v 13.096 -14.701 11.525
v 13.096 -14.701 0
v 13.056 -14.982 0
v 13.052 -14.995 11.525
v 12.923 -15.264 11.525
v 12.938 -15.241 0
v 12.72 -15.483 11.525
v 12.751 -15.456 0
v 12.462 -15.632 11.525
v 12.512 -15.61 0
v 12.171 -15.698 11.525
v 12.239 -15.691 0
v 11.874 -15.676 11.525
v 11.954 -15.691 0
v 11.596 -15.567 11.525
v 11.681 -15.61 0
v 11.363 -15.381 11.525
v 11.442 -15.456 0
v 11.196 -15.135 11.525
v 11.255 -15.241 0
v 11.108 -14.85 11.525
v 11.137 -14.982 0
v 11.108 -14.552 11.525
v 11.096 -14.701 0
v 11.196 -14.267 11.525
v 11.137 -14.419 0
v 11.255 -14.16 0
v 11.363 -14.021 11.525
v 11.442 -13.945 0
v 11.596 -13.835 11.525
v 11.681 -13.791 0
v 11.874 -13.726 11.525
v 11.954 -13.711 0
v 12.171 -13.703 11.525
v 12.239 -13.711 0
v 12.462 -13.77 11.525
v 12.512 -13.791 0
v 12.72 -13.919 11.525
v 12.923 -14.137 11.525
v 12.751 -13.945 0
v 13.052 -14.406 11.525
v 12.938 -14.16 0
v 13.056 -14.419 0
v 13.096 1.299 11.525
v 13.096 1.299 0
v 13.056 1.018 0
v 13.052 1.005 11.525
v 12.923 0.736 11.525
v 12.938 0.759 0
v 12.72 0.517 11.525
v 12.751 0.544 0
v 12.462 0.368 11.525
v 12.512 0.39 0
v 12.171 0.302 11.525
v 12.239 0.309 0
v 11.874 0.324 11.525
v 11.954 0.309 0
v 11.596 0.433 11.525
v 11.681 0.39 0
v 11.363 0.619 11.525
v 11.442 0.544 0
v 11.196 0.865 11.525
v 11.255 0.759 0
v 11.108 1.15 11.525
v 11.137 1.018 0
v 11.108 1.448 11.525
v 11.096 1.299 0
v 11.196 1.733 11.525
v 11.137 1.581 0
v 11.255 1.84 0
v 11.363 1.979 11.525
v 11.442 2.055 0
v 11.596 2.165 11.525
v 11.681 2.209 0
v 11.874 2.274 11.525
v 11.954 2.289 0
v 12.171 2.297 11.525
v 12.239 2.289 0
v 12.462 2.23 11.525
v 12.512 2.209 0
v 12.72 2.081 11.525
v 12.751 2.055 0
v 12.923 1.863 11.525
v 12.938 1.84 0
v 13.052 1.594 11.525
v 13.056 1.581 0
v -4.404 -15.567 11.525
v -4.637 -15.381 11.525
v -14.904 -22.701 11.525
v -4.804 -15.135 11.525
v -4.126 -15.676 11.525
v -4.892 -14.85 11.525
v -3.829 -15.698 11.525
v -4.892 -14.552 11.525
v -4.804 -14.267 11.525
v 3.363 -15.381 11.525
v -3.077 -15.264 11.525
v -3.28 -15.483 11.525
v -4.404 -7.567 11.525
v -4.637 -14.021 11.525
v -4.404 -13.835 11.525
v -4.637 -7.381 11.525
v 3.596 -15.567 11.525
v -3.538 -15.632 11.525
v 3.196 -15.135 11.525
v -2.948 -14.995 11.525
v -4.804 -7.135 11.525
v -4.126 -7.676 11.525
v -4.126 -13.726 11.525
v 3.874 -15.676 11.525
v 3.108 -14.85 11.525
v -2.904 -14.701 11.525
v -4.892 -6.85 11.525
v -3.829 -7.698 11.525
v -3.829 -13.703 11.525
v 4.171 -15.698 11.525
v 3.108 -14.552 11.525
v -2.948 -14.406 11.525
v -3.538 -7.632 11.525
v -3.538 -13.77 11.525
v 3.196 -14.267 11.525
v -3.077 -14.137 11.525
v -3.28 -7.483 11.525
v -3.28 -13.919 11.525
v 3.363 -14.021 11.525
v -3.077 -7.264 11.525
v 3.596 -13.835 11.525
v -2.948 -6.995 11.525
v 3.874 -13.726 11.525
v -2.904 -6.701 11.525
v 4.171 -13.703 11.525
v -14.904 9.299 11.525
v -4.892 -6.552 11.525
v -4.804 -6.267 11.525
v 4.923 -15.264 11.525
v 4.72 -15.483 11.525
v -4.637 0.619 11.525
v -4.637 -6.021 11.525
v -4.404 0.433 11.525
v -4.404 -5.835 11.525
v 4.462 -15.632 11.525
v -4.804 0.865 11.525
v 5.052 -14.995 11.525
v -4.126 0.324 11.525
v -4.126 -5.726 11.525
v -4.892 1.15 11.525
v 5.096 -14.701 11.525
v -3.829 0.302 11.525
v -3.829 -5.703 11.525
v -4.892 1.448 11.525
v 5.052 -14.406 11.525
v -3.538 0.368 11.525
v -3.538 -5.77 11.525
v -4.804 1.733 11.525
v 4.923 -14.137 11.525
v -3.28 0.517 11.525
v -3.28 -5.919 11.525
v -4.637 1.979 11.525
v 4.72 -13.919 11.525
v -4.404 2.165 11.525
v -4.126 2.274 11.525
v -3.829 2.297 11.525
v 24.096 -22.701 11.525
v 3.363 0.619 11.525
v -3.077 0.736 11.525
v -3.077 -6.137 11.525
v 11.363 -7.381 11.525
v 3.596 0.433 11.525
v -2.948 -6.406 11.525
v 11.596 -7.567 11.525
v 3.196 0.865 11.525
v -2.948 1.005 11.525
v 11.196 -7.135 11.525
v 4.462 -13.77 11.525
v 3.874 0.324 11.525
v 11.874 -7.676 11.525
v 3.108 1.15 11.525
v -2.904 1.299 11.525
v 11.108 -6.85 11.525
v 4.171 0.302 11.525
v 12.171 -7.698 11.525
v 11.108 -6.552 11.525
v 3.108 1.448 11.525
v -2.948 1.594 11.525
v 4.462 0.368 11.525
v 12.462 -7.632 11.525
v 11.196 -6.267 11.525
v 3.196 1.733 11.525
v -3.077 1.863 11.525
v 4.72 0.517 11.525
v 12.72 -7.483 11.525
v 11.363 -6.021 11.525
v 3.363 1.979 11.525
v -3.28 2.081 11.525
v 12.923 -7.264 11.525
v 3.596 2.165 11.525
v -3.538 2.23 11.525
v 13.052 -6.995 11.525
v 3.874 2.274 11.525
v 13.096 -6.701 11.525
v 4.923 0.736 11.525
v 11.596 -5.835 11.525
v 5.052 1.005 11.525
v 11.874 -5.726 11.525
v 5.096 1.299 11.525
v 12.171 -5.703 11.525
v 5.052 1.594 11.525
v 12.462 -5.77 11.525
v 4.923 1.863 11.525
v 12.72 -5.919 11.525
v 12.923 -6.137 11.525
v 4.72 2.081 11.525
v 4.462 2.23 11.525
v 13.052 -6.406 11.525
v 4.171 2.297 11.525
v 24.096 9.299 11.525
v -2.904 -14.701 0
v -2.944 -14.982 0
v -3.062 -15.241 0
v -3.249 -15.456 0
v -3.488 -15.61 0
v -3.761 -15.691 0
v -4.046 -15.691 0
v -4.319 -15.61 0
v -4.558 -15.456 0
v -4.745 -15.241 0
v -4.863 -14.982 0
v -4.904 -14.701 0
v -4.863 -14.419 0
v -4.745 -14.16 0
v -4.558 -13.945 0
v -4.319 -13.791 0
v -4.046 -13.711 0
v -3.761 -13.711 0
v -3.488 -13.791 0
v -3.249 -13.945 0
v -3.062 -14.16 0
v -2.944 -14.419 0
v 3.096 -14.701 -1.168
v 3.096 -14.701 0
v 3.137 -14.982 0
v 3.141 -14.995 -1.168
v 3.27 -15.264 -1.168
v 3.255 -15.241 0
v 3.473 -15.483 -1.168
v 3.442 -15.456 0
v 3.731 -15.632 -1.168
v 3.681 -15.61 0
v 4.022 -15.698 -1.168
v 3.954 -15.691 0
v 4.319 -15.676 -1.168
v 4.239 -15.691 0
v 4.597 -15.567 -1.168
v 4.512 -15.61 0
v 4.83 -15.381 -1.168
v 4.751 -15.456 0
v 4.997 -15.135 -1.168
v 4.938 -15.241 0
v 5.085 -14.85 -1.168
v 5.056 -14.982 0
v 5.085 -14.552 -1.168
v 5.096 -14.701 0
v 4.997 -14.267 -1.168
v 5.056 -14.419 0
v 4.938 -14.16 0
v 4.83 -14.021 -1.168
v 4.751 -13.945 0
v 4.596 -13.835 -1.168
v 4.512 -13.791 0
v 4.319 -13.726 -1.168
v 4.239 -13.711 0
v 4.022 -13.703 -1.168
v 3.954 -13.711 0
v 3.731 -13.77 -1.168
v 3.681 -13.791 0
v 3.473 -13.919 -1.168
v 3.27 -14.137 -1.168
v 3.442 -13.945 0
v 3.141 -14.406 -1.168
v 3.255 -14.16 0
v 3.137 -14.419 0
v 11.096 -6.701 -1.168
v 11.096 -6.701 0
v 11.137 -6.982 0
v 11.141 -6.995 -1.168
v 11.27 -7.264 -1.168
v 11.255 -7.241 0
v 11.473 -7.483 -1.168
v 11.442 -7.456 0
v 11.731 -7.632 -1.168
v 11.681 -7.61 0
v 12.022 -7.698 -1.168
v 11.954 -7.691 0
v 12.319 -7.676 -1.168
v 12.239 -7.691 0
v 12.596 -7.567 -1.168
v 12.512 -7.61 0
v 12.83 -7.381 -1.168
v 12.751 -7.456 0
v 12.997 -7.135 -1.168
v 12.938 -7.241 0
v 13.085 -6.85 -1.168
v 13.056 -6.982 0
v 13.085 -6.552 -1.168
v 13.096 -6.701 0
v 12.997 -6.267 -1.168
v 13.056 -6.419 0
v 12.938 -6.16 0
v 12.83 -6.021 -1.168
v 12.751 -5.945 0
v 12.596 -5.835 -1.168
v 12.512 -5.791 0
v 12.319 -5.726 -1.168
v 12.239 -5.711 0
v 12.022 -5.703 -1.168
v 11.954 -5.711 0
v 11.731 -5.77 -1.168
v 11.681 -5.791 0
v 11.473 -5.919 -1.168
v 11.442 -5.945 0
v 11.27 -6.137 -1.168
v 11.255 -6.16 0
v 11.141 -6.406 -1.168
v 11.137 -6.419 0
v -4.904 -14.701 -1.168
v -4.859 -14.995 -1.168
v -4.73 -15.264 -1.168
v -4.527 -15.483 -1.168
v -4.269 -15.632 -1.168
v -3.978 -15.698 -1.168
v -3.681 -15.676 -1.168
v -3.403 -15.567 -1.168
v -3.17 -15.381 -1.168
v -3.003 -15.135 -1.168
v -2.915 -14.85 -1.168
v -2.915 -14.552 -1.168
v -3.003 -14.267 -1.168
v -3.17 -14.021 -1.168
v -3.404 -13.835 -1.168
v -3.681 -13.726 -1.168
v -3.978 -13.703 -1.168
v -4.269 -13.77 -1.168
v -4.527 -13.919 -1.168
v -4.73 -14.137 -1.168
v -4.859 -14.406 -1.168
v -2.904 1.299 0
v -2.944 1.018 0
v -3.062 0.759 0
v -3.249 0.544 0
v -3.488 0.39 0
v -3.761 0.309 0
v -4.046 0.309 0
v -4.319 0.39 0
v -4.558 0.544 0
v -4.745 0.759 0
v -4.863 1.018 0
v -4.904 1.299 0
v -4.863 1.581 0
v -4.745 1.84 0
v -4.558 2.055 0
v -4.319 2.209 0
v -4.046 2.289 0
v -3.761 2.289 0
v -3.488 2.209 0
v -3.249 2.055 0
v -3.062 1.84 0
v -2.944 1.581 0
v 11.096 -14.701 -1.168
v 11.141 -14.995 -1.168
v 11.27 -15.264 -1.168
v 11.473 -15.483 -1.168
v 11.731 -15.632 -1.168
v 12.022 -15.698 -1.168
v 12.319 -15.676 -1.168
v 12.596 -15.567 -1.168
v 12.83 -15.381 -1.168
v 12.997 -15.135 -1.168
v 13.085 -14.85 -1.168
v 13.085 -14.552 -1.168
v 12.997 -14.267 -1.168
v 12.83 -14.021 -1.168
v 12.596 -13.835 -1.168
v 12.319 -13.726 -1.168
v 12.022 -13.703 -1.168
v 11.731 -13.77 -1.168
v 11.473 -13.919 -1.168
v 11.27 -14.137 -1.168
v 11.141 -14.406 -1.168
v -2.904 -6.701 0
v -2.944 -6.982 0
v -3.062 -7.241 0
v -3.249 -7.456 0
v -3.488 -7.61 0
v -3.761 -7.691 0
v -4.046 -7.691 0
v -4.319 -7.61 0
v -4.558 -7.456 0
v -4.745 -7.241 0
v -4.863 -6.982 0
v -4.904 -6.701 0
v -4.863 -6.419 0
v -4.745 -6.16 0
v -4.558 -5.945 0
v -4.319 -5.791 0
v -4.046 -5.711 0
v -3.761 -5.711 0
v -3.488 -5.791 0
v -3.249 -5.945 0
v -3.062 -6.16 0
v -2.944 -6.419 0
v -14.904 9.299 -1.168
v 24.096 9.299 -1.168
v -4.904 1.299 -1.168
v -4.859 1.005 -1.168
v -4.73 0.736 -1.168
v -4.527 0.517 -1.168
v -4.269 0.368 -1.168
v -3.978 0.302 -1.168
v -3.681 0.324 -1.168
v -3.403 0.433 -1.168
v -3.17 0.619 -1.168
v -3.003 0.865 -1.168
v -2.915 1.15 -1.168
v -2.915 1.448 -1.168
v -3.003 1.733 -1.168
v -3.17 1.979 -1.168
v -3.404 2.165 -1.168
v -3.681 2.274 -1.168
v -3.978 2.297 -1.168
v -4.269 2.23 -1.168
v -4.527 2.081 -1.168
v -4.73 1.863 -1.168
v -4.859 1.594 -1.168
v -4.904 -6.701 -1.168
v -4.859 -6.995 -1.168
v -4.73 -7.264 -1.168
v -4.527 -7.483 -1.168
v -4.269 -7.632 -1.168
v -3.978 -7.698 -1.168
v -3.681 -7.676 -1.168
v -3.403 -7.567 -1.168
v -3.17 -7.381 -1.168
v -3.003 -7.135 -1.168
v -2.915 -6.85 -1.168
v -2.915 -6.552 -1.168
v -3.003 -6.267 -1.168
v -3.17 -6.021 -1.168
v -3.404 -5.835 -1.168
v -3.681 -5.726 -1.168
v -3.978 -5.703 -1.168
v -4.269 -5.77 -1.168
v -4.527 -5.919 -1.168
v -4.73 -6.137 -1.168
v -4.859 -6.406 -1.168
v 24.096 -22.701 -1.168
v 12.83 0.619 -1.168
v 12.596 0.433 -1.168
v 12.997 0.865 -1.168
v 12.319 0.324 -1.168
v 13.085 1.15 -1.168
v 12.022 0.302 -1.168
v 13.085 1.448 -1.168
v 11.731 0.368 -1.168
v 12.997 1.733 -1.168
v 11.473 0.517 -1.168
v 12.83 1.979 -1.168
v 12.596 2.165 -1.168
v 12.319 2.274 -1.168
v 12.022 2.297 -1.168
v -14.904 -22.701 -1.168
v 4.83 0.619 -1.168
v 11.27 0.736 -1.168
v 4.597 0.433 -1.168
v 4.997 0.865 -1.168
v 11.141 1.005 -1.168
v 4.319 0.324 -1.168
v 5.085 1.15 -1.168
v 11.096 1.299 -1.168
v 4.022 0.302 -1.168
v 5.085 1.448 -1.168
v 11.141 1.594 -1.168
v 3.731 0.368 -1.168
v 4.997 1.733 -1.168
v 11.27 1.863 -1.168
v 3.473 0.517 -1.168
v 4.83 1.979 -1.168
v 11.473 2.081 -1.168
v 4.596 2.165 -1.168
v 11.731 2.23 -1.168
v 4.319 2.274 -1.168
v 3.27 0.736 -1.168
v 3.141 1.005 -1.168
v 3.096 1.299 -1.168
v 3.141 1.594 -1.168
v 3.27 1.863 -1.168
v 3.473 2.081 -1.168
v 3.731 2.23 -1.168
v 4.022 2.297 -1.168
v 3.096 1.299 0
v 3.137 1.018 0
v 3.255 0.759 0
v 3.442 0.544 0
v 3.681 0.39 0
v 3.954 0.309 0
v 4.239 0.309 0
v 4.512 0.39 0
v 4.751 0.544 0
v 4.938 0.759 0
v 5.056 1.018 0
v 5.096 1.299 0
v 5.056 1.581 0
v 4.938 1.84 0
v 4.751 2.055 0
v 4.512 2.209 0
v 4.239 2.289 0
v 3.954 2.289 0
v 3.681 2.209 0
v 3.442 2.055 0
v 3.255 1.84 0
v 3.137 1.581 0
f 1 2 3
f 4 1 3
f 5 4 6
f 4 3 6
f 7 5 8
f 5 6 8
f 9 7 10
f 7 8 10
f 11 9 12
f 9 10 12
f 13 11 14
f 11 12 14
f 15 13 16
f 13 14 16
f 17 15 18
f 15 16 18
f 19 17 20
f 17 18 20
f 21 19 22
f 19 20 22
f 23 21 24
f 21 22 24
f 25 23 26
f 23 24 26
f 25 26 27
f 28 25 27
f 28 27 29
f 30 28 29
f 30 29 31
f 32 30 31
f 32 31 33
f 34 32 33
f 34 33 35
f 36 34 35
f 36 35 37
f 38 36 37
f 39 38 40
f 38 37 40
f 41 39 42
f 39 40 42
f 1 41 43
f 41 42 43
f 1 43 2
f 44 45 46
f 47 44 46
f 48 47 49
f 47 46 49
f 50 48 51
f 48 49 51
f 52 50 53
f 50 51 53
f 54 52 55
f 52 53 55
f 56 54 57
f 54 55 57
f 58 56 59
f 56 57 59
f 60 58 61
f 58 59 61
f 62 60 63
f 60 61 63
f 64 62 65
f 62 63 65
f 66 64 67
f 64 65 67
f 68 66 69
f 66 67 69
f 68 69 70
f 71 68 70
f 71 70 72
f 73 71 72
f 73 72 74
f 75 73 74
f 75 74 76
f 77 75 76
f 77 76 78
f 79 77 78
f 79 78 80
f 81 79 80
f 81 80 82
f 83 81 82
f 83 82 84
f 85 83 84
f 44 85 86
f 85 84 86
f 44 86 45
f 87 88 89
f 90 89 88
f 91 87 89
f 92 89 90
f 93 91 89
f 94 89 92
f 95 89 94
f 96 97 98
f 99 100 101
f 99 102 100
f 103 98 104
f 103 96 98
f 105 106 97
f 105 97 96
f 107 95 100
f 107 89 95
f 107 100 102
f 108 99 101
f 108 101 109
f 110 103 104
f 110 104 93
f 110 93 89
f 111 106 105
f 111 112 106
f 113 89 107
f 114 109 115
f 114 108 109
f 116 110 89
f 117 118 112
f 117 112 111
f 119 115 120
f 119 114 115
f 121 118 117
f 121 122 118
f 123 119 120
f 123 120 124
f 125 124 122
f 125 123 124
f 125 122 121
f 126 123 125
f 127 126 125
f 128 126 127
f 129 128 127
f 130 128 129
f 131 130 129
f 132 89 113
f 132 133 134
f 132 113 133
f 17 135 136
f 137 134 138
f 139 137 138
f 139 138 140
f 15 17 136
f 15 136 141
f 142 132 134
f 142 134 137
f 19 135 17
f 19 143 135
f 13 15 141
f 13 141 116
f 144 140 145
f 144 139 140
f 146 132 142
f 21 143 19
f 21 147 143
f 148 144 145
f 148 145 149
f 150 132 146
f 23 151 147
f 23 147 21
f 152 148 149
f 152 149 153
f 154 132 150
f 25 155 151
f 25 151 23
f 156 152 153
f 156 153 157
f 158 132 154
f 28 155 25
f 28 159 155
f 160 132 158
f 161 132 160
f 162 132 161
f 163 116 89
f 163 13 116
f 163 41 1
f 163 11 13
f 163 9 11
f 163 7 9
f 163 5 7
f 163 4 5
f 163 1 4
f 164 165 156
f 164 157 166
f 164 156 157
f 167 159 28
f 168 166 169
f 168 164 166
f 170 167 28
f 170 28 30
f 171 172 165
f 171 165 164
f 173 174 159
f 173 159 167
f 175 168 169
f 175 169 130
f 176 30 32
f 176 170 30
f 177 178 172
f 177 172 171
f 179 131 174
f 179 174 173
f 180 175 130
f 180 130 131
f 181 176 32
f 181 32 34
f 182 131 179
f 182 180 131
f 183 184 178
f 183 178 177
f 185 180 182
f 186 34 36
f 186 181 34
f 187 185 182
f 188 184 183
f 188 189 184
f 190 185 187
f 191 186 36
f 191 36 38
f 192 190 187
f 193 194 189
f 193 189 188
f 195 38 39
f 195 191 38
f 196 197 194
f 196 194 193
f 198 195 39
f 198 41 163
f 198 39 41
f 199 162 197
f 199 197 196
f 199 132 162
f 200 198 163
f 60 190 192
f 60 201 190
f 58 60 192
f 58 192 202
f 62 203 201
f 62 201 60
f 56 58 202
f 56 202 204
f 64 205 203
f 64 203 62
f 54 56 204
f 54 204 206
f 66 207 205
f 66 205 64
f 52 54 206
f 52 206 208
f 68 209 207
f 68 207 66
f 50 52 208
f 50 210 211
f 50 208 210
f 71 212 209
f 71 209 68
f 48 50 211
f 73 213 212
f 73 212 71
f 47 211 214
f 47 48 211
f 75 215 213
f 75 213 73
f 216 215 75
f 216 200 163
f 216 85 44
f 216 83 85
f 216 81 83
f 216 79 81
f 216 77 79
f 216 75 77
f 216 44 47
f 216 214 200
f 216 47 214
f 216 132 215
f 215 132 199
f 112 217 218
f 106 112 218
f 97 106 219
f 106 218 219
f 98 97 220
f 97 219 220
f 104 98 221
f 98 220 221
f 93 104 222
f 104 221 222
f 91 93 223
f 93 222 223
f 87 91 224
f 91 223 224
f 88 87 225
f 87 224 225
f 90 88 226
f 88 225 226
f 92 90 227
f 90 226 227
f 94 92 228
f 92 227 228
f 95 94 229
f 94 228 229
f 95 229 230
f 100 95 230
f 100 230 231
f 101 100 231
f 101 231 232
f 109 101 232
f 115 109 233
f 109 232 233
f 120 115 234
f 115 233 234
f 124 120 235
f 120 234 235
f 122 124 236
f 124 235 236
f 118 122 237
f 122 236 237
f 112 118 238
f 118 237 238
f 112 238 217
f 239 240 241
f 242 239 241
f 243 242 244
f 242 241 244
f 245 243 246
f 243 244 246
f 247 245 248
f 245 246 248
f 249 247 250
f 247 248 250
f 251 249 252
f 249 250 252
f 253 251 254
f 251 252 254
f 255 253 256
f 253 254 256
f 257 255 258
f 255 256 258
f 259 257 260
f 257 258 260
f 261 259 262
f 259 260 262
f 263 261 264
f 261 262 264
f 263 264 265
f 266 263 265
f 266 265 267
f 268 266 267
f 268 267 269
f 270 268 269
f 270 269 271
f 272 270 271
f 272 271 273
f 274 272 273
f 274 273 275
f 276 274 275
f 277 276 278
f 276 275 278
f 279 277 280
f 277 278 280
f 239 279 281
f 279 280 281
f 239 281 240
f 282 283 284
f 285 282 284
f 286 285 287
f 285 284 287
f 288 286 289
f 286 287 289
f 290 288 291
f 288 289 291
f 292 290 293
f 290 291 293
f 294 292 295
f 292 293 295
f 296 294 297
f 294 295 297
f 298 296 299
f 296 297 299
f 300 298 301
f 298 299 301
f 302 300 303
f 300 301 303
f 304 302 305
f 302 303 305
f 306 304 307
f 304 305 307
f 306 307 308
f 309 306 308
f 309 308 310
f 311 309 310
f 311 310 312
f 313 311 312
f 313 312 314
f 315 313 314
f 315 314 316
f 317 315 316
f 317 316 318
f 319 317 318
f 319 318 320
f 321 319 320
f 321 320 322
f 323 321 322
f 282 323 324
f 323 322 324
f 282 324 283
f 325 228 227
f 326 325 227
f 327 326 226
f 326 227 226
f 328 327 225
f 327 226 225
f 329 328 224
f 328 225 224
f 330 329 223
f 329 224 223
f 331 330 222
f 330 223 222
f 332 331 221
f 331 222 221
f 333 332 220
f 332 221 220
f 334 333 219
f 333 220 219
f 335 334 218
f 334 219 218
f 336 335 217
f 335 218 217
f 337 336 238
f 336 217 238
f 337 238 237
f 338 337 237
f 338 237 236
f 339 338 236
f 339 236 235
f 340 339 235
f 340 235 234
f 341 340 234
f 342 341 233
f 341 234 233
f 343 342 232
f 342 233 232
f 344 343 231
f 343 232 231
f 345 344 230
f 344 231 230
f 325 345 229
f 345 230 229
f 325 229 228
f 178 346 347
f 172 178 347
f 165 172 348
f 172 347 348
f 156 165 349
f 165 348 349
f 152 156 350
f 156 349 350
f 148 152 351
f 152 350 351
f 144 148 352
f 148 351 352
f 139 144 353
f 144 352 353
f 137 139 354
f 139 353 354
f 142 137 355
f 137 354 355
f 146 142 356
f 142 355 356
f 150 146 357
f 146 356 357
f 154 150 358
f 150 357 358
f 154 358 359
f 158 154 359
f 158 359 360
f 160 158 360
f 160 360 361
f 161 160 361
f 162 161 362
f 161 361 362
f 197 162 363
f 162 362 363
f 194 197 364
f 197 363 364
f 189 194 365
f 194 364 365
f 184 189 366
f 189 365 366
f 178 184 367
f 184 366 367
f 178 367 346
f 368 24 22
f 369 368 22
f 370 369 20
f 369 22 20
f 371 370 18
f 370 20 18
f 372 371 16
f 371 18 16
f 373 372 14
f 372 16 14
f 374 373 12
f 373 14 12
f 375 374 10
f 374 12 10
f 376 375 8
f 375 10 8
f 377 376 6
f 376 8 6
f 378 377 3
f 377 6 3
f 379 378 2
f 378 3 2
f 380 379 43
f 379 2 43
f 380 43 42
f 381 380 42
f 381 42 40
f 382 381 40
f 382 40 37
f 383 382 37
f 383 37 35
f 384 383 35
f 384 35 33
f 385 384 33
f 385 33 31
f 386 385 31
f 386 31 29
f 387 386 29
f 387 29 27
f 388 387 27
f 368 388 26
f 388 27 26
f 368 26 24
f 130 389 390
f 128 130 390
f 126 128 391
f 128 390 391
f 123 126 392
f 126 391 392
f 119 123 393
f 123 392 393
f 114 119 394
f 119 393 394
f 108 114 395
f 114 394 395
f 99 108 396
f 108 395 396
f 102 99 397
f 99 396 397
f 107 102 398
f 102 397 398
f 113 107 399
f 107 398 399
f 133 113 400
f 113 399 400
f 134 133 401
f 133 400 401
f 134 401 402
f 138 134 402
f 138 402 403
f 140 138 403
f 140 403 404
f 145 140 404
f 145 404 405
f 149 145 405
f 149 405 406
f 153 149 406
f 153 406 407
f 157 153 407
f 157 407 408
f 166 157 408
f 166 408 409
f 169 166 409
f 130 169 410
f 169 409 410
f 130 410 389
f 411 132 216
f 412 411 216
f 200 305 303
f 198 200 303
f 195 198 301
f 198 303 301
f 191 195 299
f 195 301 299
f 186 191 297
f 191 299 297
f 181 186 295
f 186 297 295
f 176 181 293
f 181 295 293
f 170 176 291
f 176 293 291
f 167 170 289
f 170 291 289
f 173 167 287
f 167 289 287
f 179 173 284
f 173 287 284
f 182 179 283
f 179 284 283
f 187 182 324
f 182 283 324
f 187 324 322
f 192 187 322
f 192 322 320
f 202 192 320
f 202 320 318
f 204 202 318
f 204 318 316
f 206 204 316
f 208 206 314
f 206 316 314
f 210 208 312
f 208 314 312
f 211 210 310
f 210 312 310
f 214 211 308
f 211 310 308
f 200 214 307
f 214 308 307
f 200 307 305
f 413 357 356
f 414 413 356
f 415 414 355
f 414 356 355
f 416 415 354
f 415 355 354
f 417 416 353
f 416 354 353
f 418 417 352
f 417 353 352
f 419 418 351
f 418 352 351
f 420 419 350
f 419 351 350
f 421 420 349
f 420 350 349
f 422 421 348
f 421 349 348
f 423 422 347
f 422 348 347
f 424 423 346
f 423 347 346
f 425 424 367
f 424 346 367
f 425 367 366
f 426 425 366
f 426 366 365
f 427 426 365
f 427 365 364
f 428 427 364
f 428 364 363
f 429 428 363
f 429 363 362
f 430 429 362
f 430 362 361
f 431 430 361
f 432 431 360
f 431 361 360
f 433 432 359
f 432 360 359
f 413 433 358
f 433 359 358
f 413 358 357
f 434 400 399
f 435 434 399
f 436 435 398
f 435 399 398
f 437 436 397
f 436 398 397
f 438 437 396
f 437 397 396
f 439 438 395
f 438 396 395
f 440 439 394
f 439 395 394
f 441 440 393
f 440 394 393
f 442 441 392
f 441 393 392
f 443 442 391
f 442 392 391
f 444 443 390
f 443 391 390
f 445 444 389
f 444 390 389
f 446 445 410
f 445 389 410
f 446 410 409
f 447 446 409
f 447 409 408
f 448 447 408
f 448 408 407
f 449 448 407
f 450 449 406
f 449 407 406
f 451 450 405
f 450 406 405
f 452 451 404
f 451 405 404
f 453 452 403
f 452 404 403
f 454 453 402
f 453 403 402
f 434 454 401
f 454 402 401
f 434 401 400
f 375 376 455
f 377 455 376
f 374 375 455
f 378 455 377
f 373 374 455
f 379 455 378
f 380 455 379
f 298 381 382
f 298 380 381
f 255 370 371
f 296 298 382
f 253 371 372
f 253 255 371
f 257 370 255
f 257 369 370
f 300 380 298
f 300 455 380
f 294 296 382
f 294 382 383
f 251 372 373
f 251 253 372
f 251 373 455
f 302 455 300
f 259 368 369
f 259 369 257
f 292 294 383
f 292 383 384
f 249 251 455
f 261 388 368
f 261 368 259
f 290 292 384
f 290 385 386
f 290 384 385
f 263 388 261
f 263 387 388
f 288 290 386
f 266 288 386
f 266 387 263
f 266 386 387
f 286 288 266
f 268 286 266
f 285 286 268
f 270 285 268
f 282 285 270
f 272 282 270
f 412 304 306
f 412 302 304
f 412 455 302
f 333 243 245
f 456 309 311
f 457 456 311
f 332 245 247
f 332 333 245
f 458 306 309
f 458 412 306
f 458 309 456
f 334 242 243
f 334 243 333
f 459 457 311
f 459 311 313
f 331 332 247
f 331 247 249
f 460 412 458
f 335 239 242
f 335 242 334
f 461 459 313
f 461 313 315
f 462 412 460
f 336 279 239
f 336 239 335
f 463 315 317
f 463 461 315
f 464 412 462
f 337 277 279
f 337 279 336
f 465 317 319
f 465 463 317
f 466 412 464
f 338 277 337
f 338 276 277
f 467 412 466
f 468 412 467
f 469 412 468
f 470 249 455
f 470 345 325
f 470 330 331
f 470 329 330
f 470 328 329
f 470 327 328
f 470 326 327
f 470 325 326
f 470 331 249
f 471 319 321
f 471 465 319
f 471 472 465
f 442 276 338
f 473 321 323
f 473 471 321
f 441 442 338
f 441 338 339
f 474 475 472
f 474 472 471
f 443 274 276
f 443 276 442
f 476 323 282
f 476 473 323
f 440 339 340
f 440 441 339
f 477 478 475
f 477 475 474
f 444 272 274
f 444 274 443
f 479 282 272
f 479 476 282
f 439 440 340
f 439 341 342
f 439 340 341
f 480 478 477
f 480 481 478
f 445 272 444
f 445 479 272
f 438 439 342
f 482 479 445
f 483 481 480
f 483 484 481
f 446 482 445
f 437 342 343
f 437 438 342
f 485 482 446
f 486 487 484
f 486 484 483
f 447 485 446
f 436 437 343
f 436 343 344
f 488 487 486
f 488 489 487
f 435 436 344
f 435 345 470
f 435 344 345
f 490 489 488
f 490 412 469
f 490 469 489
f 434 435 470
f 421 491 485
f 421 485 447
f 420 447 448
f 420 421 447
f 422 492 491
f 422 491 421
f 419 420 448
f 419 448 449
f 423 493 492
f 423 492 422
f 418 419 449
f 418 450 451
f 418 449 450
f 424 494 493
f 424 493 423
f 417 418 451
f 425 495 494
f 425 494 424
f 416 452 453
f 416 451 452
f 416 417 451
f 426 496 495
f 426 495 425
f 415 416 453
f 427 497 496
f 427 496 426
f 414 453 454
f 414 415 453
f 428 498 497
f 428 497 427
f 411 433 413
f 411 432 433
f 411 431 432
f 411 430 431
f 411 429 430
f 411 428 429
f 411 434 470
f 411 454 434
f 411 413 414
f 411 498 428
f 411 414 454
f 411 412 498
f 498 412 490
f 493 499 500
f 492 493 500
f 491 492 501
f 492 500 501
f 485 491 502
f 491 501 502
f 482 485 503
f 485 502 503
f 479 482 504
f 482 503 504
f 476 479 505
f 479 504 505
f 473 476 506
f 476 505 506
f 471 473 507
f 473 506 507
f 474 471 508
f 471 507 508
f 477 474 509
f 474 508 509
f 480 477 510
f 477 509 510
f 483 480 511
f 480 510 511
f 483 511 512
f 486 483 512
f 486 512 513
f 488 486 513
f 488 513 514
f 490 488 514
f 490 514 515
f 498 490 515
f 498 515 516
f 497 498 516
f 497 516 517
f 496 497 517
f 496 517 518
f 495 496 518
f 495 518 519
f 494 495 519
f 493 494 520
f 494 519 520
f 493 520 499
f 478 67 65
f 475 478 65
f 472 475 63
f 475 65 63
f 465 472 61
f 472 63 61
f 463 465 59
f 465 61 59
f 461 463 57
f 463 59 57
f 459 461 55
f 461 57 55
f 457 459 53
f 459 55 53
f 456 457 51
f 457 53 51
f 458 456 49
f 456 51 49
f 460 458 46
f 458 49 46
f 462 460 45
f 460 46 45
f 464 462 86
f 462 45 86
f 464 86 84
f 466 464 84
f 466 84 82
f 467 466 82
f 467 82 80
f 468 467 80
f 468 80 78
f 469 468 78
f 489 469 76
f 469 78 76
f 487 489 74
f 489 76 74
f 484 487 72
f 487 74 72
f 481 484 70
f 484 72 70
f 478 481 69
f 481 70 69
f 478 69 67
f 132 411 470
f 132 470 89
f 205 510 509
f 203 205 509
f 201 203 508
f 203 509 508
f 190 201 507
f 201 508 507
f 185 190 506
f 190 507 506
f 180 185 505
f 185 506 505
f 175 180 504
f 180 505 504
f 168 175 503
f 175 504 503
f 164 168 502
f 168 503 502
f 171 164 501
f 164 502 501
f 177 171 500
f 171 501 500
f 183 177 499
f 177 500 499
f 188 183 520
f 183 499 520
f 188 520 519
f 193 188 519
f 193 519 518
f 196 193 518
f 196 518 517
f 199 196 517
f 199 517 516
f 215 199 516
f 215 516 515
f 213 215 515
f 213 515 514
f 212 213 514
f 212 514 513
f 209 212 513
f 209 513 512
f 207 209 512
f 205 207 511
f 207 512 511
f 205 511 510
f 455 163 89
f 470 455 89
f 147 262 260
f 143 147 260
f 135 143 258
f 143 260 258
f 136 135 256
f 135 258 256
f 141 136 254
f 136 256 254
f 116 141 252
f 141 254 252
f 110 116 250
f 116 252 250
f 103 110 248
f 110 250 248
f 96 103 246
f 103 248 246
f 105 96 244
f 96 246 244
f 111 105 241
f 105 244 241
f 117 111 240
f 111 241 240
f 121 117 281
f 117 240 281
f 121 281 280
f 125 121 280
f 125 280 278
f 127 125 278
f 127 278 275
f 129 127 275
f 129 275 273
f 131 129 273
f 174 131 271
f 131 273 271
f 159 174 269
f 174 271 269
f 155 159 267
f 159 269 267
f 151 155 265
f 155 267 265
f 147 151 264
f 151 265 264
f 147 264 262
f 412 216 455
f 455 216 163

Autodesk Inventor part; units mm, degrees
ref_plane "YZ Plane" through (0, 0, 0) normal (1, 0, 0) x (0, 1, 0)
ref_plane "XZ Plane" through (0, 0, 0) normal (0, 1, 0) x (-1, 0, 0)
ref_plane "XY Plane" through (0, 0, 0) normal (0, 0, 1) x (1, 0, 0)
sketch "Sketch1" plane through (0, 0, 0) normal (0, 0, 1) x (1, 0, 0)
  line L0 (-15.9035, 8.2993) -> (24.0965, 8.2993)
  line L1 (24.0965, 8.2993) -> (24.0965, -21.7007)
  line L2 (24.0965, -21.7007) -> (-15.9035, -21.7007)
  line L3 (-15.9035, -21.7007) -> (-15.9035, 8.2993)
  point P0 (0, 0)
  dimension "d0" = 40
  dimension "d1" = 30
extrude "Extrusion1" add sketch "Sketch1" along normal blind 2
sketch "Sketch2" plane through (0, 0, 2) normal (0, 0, 1) x (1, 0, 0)
  line L0 (-15.9035, -21.7007) -> (-15.9035, 8.2993) projected
  line L1 (24.0965, -21.7007) -> (-15.9035, -21.7007) projected
  line L2 (-15.9035, -6.7007) -> (4.0965, -6.7007)
  line L3 (4.0965, -6.7007) -> (4.0965, -14.7007)
  line L4 (4.0965, -14.7007) -> (-3.9035, -14.7007)
  line L5 (-3.9035, -14.7007) -> (-3.9035, 1.2993)
  line L6 (-3.9035, 1.2993) -> (12.0965, 1.2993)
  line L7 (12.0965, 1.2993) -> (12.0965, -14.7007)
  circle A0 centre (12.0965, -6.7007) radius 1
  circle A1 centre (12.0965, 1.2993) radius 1
  circle A2 centre (4.0965, 1.2993) radius 1
  circle A3 centre (-3.9035, 1.2993) radius 1
  circle A4 centre (-3.9035, -6.7007) radius 1
  circle A5 centre (-3.9035, -14.7007) radius 1
  circle A6 centre (4.0965, -14.7007) radius 1
  circle A7 centre (12.0965, -14.7007) radius 1
  point P0 (0, 0)
  dimension "d4" = 8
  dimension "d5" = 8
  dimension "d6" = 16
  dimension "d7" = 16
  dimension "d8" = 16
  dimension "d9" = 2
extrude "Extrusion2" cut sketch "Sketch2" against normal blind 2 contours A7 | A0 L7 | L7 A0 | A1 L7 L6 | L6 L7 A1 | A2 L6 | L6 A2 | A3 L6 L5 | L5 L6 A3 | A4 L5 L2 | L2 L5 A4 | L5 A4 L2 | L2 A4 L5 | A6 L4 L3 | L3 L4 A6 | A5 L4 L5 | L5 L4 A5
sketch "Sketch3" plane through (-15.9035, -21.7007, 0) normal (0, -1, 0) x (1, 0, 0)
  line L0 (40, 2) -> (0, 2) projected
  line L1 (0, 0) -> (0, 2) projected
  line L2 (40, 0) -> (0, 0) projected
  line L3 (40, 0) -> (40, 2) projected
  point P0 (15.9035, 0)
extrude "Extrusion3" add sketch "Sketch3" along normal blind 1
sketch "Sketch4" plane through (-15.9035, 8.2993, 0) normal (0, 1, 0) x (1, 0, 0)
  line L0 (0, -2) -> (40, -2) projected
  line L1 (40, 0) -> (40, -2) projected
  line L2 (0, 0) -> (40, 0) projected
  line L3 (0, 0) -> (0, -2) projected
  point P0 (15.9035, 0)
extrude "Extrusion4" add sketch "Sketch4" along normal blind 1
sketch "Sketch5" plane through (0, 0, 2) normal (0, 0, 1) x (1, 0, 0)
  circle A0 centre (12.0965, -14.7007) radius 1 projected
  circle A1 centre (4.0965, -14.7007) radius 1 projected
  circle A2 centre (-3.9035, -14.7007) radius 1 projected
  circle A3 centre (-3.9035, -6.7007) radius 1 projected
  circle A4 centre (-3.9035, 1.2993) radius 1 projected
  circle A5 centre (4.0965, 1.2993) radius 1 projected
  circle A6 centre (12.0965, 1.2993) radius 1 projected
  circle A7 centre (12.0965, -6.7007) radius 1 projected
  line L0 (24.0965, 9.2993) -> (24.0965, -22.7007) projected
  line L1 (24.0965, 9.2993) -> (-15.9035, 9.2993) projected
  line L2 (-15.9035, -22.7007) -> (-15.9035, 9.2993) projected
  line L3 (-15.9035, -22.7007) -> (24.0965, -22.7007) projected
  point P0 (0, 0)
extrude "Extrusion5" add sketch "Sketch5" along normal blind 9.525
sketch "Sketch6" plane through (0, 0, 0) normal (0, 0, -1) x (-1, 0, 0)
  circle A0 centre (-12.0965, -14.7007) radius 1 projected
  circle A1 centre (-4.0965, -14.7007) radius 1 projected
  circle A2 centre (3.9035, -14.7007) radius 1 projected
  circle A3 centre (3.9035, -6.7007) radius 1 projected
  circle A4 centre (3.9035, 1.2993) radius 1 projected
  circle A5 centre (-4.0965, 1.2993) radius 1 projected
  circle A6 centre (-12.0965, 1.2993) radius 1 projected
  circle A7 centre (-12.0965, -6.7007) radius 1 projected
  line L0 (-24.0965, 9.2993) -> (-24.0965, -22.7007) projected
  line L1 (-24.0965, -22.7007) -> (15.9035, -22.7007) projected
  line L2 (15.9035, -22.7007) -> (15.9035, 9.2993) projected
  line L3 (15.9035, 9.2993) -> (-24.0965, 9.2993) projected
  point P0 (0, 0)
extrude "Extrusion6" add sketch "Sketch6" along normal blind 1.1684
sketch "Sketch7" plane through (-15.9035, -22.7007, 0) normal (0, -1, 0) x (1, 0, 0)
  line L0 (40, 11.525) -> (0, 11.525) projected
  line L1 (0, -1.1684) -> (1, -1.1684)
  line L2 (1, -1.1684) -> (1, 11.525)
  line L3 (1, 11.525) -> (0, 11.525)
  line L4 (0, 11.525) -> (0, -1.1684)
  point P0 (15.9035, 0)
  dimension "d20" = 1
extrude "Extrusion7" cut sketch "Sketch7" against normal blind 50.8
properties part number "hconnector"
